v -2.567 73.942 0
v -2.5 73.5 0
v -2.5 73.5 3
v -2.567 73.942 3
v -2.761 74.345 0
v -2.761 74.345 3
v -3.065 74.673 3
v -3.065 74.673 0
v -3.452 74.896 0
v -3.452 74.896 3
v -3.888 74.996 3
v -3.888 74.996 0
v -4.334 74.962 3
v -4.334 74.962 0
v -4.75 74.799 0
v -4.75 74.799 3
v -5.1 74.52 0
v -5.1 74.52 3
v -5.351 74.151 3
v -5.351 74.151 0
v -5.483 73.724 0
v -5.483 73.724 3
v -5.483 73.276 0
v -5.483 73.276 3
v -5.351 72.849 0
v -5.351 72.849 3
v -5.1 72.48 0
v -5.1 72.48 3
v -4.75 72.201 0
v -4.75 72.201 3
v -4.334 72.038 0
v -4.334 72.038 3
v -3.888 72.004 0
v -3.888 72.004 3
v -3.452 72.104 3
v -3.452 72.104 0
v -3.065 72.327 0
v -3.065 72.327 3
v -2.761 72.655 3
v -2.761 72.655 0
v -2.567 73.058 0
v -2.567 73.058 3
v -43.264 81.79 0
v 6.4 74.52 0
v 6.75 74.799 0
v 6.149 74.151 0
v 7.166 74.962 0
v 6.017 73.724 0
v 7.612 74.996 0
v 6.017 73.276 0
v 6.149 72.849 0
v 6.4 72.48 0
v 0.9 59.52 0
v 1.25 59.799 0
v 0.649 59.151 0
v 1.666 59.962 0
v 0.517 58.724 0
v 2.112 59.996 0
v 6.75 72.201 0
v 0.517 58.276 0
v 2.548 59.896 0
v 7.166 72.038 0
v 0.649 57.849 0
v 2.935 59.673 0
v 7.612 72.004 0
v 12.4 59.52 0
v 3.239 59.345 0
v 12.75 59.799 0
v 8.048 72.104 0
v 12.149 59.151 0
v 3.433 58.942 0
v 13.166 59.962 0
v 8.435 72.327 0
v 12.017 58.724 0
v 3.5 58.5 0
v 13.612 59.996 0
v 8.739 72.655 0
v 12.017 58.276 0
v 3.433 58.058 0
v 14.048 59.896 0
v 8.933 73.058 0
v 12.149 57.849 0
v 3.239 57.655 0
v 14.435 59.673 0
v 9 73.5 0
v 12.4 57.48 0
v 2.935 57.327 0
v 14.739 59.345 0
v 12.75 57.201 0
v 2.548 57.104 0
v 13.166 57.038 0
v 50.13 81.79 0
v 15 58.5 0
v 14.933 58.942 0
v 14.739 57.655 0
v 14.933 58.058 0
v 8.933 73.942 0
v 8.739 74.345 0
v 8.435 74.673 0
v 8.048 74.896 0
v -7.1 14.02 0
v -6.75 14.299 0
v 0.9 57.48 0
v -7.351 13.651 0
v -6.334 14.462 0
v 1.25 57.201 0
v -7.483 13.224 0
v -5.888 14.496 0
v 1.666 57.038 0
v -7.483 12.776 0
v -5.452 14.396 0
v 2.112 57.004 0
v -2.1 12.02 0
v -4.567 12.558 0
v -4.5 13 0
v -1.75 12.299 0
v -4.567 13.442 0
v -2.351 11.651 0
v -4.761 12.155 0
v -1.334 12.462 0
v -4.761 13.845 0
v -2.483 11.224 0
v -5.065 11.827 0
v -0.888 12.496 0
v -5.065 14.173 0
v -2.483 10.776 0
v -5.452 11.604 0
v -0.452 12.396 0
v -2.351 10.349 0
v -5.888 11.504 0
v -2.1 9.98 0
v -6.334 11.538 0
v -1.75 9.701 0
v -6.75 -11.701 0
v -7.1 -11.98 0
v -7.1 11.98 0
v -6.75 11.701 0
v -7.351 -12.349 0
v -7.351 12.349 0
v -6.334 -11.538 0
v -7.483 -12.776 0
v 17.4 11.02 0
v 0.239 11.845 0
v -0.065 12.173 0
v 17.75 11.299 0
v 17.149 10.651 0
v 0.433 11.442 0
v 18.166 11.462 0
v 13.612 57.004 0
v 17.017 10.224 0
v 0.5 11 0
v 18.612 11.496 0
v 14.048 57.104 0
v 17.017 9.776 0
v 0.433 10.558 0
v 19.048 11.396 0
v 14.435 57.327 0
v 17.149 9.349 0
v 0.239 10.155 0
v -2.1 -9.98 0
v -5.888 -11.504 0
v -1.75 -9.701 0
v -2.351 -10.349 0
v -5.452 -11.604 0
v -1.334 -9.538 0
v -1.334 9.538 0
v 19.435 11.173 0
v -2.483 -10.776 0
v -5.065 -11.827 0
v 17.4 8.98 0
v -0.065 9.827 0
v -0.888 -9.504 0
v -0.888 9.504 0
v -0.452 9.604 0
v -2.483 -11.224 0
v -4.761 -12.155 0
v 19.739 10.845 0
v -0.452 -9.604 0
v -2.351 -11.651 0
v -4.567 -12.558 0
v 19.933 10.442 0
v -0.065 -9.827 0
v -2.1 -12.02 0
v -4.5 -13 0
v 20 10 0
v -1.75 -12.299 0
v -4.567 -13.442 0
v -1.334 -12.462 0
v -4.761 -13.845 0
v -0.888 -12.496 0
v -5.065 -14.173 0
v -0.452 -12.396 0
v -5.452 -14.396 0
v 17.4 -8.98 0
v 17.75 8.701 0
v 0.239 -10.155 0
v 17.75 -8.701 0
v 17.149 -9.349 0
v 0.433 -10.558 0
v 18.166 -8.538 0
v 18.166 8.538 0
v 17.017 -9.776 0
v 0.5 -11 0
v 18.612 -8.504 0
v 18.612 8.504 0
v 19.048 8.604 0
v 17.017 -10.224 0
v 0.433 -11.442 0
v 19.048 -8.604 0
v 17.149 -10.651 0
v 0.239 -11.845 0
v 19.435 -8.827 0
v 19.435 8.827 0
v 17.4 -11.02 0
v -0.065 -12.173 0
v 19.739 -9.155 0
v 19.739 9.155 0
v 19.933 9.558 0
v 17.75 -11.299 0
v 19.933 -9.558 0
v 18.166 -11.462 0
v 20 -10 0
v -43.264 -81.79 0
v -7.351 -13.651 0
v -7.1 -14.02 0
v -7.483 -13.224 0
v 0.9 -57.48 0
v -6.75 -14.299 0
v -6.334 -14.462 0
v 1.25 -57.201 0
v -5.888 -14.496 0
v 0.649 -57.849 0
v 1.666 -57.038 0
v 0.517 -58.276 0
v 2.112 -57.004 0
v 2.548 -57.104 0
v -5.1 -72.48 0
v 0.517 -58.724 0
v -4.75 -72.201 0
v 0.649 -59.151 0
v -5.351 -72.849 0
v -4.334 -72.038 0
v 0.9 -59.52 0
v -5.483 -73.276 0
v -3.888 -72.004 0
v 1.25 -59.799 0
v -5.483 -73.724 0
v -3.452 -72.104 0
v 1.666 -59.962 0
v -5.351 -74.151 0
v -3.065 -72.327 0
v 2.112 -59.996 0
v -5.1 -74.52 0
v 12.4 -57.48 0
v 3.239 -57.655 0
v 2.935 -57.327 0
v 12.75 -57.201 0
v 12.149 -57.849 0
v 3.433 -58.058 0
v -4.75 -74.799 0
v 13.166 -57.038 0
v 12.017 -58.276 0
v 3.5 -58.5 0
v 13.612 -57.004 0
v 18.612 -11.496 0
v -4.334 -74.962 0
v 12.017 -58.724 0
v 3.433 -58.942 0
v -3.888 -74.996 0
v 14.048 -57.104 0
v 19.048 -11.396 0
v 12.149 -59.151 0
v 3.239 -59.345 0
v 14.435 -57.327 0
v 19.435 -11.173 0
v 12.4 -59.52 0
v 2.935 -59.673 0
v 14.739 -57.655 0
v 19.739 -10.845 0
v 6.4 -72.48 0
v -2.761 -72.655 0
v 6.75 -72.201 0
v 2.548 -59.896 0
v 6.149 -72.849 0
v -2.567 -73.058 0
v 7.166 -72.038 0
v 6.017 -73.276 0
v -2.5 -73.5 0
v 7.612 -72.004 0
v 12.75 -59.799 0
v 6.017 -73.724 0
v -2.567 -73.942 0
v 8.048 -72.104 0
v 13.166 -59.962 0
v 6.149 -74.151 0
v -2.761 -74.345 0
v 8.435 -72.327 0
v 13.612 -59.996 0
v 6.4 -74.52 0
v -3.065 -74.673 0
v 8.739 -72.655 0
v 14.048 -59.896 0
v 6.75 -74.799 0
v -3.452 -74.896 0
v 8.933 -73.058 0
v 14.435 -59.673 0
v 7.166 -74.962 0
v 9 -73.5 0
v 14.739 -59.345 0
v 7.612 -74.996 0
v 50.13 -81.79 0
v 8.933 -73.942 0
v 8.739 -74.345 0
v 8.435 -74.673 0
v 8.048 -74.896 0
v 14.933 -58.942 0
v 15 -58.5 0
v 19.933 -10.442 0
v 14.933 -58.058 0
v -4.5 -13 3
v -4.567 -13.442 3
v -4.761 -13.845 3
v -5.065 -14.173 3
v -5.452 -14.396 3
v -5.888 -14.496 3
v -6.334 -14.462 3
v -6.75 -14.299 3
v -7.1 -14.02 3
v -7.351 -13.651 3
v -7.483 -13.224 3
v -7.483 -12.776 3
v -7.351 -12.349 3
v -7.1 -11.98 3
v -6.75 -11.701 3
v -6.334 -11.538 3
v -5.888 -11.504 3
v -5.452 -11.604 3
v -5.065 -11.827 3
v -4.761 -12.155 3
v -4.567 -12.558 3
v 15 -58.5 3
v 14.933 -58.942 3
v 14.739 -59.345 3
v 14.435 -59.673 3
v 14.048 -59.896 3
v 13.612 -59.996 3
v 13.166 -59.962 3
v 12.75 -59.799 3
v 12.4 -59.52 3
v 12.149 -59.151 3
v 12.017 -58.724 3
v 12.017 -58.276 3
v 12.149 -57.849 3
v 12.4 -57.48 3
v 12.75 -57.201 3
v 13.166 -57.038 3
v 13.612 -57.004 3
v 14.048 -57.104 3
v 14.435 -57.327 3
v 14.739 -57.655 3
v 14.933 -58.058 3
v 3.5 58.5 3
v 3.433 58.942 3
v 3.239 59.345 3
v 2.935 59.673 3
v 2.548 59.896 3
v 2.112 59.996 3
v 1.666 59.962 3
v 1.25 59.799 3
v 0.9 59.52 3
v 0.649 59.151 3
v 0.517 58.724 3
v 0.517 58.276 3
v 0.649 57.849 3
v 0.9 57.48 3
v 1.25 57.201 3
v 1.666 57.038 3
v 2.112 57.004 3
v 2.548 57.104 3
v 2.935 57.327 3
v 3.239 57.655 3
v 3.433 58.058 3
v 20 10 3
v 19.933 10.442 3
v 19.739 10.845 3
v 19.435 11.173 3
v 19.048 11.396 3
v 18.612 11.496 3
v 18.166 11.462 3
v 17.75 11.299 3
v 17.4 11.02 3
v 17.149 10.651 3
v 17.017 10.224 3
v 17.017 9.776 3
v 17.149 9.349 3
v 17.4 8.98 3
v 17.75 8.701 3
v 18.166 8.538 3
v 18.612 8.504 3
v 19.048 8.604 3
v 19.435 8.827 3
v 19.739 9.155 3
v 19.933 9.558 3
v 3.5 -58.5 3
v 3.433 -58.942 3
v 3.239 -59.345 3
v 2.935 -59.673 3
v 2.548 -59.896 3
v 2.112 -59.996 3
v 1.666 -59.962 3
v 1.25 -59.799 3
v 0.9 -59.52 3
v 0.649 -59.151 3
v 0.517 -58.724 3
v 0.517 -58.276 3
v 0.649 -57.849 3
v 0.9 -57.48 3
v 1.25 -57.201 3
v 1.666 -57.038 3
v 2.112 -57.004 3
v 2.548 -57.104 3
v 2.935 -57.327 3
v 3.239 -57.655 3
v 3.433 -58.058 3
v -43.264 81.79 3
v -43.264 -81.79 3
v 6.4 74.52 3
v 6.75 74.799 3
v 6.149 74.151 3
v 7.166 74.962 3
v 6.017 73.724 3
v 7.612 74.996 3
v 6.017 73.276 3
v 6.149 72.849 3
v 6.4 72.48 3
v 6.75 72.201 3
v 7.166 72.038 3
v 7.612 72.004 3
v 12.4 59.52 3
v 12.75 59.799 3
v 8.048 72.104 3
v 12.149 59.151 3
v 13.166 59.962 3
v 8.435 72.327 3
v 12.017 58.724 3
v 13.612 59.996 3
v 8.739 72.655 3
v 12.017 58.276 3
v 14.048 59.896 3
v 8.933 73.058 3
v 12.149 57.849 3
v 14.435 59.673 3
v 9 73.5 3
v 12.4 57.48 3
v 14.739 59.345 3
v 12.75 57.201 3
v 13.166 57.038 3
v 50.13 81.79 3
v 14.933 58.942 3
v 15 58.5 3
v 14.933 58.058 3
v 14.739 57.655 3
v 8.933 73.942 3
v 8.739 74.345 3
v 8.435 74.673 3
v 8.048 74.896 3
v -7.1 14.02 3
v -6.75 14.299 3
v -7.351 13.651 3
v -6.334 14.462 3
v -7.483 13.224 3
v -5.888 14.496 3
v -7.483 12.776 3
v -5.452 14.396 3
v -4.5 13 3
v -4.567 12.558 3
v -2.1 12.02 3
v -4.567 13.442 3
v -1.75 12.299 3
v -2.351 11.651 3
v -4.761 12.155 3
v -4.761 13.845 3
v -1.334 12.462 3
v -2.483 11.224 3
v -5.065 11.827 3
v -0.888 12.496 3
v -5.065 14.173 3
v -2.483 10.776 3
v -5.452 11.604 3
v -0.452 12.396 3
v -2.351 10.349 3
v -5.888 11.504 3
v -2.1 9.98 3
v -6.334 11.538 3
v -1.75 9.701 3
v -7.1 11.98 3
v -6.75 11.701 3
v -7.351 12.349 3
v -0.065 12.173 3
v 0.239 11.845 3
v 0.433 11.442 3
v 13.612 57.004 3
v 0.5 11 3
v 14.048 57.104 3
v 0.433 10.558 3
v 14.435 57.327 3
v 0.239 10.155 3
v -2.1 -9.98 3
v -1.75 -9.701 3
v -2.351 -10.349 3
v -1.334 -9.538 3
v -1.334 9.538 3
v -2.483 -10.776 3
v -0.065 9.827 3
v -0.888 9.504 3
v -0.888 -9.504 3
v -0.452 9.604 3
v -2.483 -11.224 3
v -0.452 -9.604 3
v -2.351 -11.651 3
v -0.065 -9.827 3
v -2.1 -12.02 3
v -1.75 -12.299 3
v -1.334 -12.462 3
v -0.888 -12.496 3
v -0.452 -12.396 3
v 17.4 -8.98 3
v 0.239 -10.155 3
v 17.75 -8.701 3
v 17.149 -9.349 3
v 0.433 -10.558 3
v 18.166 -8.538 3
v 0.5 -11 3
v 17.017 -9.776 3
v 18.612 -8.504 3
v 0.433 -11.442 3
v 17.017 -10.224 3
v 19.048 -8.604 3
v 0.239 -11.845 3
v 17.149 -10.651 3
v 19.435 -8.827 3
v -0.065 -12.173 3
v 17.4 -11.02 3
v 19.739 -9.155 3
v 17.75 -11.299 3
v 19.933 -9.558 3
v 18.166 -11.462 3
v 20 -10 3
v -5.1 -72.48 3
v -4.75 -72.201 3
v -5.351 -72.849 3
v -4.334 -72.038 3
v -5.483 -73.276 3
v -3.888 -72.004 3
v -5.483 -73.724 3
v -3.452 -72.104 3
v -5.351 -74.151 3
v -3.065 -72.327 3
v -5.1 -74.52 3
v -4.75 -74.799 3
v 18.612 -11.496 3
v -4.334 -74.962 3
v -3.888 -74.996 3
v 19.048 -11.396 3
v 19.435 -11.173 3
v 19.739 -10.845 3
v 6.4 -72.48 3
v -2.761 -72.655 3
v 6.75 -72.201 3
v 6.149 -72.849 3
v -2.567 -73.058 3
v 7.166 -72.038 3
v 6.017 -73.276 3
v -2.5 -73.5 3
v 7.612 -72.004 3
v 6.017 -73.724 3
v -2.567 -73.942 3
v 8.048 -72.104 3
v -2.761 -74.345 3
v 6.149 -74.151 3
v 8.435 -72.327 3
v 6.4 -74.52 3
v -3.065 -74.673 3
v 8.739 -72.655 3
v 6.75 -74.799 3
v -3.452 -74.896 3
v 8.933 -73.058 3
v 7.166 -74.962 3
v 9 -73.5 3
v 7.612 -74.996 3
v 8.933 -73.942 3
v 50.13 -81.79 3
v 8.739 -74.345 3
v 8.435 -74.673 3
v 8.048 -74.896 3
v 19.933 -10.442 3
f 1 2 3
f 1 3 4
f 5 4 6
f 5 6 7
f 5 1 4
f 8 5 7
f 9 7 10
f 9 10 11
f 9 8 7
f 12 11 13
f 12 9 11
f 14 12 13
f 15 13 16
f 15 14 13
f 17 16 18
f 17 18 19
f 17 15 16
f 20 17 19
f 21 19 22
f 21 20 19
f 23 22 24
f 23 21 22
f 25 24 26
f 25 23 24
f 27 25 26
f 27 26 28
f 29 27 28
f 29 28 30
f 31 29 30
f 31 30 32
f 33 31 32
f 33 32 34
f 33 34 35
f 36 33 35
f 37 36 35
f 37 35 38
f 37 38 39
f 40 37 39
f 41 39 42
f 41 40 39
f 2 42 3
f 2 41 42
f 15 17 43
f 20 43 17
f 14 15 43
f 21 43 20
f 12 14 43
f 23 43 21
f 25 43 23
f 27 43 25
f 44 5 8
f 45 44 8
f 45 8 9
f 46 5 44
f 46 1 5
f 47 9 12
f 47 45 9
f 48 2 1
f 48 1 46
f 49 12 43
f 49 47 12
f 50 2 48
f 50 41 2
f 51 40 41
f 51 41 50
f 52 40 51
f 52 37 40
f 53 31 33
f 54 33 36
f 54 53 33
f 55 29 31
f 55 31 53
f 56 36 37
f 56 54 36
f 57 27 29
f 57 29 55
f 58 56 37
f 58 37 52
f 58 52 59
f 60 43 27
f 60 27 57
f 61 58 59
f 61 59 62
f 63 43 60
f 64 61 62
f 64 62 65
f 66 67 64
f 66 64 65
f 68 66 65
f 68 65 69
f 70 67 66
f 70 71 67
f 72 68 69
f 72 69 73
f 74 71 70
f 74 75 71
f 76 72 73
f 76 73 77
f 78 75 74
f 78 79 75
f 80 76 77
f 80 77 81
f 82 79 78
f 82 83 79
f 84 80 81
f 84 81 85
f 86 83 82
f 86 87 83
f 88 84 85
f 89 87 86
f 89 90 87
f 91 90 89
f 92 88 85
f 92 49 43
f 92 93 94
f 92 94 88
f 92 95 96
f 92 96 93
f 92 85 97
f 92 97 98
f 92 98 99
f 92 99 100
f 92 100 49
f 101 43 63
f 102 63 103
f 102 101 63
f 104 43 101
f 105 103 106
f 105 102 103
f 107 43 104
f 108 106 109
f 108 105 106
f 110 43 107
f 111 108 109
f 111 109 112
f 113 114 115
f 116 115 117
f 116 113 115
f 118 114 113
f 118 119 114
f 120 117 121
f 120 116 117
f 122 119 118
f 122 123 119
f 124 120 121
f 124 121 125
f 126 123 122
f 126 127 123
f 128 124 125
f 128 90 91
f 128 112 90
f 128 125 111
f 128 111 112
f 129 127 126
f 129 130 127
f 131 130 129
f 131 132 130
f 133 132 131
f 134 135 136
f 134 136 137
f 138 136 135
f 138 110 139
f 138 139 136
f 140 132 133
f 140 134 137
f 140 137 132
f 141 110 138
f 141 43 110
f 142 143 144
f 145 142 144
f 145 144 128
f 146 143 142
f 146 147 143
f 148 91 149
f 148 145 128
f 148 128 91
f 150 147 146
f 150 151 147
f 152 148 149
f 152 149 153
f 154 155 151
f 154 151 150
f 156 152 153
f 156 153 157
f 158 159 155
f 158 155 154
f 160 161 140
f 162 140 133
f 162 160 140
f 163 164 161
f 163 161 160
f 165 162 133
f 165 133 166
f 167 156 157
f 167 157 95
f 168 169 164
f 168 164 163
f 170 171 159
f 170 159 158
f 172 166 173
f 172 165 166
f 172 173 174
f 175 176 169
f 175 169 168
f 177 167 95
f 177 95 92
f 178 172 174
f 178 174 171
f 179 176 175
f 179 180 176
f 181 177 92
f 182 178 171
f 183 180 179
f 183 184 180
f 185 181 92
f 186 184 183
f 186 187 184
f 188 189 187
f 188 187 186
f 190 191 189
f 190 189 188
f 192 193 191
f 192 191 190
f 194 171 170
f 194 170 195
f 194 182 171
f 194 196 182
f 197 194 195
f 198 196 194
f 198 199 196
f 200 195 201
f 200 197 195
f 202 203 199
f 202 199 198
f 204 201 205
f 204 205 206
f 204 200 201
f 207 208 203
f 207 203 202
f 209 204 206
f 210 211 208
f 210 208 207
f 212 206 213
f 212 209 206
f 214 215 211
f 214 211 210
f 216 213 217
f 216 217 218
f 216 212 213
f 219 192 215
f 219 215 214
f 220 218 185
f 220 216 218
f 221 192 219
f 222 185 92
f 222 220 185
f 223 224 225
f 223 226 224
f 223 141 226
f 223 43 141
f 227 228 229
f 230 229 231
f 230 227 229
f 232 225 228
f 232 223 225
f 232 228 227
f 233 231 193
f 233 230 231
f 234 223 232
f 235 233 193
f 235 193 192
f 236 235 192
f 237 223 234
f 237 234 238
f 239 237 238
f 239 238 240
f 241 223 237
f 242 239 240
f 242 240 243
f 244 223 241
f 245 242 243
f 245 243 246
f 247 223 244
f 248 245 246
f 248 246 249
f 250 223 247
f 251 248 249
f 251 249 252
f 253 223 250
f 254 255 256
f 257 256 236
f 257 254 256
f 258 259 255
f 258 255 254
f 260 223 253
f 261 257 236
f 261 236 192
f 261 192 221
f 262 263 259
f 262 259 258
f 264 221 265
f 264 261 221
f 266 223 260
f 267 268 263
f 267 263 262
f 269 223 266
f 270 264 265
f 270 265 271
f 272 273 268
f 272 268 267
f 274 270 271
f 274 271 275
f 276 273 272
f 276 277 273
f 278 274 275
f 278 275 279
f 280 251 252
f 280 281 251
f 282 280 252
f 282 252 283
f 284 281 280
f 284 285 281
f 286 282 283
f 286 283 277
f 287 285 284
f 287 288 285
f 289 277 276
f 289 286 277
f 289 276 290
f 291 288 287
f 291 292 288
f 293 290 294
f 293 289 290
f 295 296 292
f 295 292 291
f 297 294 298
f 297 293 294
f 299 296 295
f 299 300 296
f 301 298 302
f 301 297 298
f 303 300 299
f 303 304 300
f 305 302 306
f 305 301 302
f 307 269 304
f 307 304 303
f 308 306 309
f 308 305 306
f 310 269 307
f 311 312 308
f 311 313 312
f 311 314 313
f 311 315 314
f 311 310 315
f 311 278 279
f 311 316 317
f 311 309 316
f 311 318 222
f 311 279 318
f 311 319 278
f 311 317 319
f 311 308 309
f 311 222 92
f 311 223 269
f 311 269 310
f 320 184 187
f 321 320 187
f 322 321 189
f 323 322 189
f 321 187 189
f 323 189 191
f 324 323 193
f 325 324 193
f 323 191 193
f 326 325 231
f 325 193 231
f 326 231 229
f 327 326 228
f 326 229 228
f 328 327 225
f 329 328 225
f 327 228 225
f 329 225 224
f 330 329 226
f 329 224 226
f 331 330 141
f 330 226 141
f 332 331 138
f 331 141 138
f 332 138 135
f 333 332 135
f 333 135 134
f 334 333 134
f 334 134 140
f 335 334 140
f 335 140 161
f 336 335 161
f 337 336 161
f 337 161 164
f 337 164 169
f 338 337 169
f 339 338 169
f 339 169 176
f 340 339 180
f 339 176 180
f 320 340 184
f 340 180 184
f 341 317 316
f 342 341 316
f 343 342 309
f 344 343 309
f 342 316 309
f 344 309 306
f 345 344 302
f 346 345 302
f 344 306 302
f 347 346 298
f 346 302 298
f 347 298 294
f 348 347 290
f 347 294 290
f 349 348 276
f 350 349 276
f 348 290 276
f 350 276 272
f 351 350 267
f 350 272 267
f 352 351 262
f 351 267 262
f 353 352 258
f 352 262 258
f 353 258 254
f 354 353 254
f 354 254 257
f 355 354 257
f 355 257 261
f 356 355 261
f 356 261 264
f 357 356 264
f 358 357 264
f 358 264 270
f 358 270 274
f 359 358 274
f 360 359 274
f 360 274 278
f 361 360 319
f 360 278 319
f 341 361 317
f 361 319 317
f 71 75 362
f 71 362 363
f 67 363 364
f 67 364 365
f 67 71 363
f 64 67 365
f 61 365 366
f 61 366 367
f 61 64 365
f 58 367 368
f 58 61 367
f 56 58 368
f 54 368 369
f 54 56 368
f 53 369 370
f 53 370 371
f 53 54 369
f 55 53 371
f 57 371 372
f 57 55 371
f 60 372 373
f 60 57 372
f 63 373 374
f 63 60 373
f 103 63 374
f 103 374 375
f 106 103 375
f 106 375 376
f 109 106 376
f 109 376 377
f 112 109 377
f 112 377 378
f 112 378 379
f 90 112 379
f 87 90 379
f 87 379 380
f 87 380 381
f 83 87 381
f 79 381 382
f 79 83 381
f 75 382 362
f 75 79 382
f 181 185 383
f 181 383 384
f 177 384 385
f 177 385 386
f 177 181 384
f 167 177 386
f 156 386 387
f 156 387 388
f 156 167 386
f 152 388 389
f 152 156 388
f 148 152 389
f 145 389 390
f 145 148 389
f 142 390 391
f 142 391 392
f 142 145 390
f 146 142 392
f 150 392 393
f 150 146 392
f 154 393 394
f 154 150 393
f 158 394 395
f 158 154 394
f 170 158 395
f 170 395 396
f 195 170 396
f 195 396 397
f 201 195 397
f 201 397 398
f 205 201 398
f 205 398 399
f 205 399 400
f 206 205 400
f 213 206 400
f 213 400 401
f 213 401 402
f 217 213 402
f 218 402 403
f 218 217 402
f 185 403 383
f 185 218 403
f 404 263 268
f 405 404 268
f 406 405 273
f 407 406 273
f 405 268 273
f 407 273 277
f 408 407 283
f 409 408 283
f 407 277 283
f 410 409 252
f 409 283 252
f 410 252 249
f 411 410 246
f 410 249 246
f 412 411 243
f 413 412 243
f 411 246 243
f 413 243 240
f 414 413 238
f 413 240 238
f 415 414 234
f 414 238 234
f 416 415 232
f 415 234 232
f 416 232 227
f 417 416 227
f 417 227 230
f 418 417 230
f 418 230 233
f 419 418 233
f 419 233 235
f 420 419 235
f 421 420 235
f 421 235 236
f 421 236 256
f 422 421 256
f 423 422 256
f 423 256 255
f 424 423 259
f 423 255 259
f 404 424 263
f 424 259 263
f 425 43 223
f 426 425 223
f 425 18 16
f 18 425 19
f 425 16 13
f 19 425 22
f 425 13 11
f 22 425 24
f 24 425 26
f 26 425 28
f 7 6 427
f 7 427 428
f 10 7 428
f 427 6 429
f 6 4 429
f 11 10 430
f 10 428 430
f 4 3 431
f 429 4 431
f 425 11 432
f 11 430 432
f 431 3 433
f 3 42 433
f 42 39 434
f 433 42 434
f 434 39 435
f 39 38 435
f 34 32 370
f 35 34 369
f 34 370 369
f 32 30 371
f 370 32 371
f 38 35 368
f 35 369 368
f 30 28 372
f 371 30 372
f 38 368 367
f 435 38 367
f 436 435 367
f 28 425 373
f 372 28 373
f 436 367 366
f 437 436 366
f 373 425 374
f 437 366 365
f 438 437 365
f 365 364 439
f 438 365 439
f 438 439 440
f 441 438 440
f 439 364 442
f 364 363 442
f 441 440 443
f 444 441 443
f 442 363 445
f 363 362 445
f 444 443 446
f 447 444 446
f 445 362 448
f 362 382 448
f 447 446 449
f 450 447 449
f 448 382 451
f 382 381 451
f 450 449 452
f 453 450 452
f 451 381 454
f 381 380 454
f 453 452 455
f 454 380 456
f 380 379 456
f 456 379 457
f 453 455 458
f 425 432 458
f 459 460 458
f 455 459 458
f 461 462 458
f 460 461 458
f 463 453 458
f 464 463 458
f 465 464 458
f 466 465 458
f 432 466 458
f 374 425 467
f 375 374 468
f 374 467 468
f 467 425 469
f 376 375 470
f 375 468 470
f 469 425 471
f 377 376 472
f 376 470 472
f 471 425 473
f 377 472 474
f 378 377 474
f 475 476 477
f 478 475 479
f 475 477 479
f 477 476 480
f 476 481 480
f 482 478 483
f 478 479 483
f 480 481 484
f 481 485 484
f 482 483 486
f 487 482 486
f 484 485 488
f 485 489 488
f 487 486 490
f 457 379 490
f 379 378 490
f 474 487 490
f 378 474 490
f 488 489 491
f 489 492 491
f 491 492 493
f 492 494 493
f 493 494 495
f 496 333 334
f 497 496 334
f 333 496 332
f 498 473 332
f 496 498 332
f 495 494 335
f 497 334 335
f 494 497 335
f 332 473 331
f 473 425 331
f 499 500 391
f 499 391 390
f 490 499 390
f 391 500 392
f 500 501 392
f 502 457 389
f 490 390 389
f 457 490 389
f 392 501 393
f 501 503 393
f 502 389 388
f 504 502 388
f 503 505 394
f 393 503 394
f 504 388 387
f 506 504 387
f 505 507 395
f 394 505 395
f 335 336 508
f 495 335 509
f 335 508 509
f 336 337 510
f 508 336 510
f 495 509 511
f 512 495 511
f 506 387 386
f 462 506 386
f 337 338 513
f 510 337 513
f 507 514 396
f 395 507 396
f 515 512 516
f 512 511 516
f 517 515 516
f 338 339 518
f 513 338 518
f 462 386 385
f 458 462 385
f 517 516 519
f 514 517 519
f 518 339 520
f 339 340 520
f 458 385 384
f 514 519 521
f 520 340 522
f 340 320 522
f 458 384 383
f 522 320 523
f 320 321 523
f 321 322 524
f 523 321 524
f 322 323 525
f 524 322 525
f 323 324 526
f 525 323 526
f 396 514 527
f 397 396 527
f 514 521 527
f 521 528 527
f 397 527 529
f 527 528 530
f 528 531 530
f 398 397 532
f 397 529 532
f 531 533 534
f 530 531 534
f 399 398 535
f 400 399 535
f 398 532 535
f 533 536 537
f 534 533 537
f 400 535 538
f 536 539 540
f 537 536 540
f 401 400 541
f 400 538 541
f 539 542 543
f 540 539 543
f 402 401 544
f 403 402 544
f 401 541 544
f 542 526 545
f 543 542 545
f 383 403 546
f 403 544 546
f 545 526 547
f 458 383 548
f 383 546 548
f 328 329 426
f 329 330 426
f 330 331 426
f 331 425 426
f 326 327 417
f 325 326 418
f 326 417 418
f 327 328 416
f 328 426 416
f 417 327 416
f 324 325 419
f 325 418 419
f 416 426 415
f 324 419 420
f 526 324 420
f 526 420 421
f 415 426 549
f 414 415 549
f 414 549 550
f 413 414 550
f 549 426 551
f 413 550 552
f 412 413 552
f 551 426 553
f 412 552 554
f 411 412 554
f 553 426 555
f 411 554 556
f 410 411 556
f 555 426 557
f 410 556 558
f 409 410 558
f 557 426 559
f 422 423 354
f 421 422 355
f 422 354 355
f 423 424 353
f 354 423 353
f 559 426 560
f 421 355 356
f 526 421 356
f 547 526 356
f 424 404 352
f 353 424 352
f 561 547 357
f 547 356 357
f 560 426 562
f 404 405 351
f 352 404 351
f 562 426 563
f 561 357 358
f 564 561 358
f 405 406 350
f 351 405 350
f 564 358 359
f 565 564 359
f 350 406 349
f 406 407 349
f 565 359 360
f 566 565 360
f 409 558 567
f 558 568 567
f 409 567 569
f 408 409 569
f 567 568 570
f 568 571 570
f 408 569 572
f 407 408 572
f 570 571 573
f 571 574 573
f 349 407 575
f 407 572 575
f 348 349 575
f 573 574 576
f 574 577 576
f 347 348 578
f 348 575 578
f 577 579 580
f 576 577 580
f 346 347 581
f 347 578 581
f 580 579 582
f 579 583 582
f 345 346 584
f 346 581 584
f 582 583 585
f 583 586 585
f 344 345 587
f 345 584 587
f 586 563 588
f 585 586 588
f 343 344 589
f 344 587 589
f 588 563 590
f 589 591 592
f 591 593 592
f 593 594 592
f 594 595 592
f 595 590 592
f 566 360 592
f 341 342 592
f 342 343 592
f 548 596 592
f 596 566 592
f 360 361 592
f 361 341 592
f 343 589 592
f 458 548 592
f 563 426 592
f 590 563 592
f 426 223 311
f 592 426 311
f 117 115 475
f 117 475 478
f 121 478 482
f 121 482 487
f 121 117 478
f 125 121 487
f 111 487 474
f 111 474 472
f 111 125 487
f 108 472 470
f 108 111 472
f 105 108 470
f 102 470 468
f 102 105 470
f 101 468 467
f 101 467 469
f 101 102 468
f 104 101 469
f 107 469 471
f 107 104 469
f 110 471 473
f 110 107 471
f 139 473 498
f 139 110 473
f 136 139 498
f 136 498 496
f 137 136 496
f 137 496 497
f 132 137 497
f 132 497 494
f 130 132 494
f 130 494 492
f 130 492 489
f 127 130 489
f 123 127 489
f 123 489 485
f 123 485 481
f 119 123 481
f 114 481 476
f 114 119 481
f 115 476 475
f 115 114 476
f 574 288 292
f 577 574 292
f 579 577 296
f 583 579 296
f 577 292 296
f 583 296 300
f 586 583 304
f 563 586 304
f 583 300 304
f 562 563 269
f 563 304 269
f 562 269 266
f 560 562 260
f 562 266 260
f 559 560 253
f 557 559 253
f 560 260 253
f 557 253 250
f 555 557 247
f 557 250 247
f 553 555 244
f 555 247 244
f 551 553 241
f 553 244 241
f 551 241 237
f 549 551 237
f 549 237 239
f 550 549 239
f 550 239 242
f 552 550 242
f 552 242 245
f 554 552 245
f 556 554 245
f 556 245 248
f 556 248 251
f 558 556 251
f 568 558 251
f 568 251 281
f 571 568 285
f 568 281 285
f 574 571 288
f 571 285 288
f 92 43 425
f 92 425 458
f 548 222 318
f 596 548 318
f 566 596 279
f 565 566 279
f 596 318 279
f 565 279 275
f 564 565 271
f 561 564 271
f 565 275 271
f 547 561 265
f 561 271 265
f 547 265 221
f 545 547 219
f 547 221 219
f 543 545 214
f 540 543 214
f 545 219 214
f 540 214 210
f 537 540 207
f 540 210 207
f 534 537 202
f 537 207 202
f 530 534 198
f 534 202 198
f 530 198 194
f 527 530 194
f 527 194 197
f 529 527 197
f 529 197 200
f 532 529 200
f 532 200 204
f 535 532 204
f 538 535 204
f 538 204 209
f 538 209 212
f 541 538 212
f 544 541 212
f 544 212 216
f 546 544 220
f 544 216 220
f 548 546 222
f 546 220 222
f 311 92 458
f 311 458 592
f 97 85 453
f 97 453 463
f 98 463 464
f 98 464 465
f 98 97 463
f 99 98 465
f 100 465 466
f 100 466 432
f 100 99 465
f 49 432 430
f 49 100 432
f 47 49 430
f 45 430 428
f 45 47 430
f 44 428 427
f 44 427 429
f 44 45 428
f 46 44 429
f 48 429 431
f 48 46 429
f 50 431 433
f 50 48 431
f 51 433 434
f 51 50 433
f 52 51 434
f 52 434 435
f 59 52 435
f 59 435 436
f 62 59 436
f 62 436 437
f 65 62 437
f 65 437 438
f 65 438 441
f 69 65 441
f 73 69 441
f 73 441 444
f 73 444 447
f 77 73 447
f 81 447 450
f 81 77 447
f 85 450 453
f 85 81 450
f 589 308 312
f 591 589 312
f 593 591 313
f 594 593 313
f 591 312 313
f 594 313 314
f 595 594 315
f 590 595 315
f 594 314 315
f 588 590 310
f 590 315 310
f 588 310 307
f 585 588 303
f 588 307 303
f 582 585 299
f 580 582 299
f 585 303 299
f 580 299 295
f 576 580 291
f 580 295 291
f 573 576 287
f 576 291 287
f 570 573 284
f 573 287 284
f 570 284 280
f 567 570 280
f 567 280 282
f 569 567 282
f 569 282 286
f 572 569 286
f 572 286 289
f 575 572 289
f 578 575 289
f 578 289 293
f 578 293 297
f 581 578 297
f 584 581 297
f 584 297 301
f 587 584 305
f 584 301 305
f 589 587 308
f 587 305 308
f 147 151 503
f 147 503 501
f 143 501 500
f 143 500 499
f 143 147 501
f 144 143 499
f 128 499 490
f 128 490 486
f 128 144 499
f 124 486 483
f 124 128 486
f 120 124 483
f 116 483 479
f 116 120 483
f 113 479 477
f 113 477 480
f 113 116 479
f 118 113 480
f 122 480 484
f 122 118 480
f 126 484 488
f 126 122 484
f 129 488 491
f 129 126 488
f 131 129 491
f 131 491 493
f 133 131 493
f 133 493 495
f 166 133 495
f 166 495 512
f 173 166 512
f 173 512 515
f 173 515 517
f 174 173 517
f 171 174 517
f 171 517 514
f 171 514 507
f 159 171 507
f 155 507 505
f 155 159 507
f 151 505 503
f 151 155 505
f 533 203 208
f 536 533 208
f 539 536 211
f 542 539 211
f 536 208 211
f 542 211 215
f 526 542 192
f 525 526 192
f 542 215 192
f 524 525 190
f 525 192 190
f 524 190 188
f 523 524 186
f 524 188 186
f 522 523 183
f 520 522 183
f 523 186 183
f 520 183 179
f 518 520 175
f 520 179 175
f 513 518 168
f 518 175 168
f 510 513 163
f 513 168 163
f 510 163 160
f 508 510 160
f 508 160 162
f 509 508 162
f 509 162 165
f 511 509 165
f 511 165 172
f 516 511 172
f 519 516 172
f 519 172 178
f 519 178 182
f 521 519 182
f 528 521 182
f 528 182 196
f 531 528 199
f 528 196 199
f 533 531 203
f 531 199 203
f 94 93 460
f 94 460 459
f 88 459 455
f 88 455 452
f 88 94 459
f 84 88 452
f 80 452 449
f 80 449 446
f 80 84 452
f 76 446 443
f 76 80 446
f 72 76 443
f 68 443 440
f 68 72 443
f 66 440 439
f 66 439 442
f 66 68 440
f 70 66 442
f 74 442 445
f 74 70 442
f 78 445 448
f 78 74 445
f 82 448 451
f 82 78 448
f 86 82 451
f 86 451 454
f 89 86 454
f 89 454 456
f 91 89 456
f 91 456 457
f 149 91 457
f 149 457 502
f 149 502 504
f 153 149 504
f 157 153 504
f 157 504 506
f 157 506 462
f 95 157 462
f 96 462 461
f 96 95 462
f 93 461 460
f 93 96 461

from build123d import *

# Parameters (mm, degrees)
SZKIC1_W                    = 93.394041507
SZKIC1_H                    = 81.79044571
SZKIC1_R                    = 1.5
DODANIE_WYCI_GNI_CIE2_DEPTH = 3


with BuildPart() as part:
    # Szkic1 → Dodanie-wyciągnięcie2 (new body)
    with BuildSketch(Plane.XY):
        with Locations((3.432858123, 40.895222855)):
            Rectangle(SZKIC1_W, SZKIC1_H)
        with Locations((-1, 11)):
            Circle(SZKIC1_R, mode=Mode.SUBTRACT)
        with Locations((18.5, 10)):
            Circle(SZKIC1_R, mode=Mode.SUBTRACT)
        with Locations((-6, 13)):
            Circle(SZKIC1_R, mode=Mode.SUBTRACT)
        with Locations((2, 58.5)):
            Circle(SZKIC1_R, mode=Mode.SUBTRACT)
        with Locations((13.5, 58.5)):
            Circle(SZKIC1_R, mode=Mode.SUBTRACT)
        with Locations((-4, 73.5)):
            Circle(SZKIC1_R, mode=Mode.SUBTRACT)
        with Locations((7.5, 73.5)):
            Circle(SZKIC1_R, mode=Mode.SUBTRACT)
    dodanie_wyci_gni_cie2 = extrude(amount=DODANIE_WYCI_GNI_CIE2_DEPTH)

    # Lustro4: Dodanie-wyciągnięcie2 across plane
    add(dodanie_wyci_gni_cie2.mirror(Plane.ZX))


solid = part.part
